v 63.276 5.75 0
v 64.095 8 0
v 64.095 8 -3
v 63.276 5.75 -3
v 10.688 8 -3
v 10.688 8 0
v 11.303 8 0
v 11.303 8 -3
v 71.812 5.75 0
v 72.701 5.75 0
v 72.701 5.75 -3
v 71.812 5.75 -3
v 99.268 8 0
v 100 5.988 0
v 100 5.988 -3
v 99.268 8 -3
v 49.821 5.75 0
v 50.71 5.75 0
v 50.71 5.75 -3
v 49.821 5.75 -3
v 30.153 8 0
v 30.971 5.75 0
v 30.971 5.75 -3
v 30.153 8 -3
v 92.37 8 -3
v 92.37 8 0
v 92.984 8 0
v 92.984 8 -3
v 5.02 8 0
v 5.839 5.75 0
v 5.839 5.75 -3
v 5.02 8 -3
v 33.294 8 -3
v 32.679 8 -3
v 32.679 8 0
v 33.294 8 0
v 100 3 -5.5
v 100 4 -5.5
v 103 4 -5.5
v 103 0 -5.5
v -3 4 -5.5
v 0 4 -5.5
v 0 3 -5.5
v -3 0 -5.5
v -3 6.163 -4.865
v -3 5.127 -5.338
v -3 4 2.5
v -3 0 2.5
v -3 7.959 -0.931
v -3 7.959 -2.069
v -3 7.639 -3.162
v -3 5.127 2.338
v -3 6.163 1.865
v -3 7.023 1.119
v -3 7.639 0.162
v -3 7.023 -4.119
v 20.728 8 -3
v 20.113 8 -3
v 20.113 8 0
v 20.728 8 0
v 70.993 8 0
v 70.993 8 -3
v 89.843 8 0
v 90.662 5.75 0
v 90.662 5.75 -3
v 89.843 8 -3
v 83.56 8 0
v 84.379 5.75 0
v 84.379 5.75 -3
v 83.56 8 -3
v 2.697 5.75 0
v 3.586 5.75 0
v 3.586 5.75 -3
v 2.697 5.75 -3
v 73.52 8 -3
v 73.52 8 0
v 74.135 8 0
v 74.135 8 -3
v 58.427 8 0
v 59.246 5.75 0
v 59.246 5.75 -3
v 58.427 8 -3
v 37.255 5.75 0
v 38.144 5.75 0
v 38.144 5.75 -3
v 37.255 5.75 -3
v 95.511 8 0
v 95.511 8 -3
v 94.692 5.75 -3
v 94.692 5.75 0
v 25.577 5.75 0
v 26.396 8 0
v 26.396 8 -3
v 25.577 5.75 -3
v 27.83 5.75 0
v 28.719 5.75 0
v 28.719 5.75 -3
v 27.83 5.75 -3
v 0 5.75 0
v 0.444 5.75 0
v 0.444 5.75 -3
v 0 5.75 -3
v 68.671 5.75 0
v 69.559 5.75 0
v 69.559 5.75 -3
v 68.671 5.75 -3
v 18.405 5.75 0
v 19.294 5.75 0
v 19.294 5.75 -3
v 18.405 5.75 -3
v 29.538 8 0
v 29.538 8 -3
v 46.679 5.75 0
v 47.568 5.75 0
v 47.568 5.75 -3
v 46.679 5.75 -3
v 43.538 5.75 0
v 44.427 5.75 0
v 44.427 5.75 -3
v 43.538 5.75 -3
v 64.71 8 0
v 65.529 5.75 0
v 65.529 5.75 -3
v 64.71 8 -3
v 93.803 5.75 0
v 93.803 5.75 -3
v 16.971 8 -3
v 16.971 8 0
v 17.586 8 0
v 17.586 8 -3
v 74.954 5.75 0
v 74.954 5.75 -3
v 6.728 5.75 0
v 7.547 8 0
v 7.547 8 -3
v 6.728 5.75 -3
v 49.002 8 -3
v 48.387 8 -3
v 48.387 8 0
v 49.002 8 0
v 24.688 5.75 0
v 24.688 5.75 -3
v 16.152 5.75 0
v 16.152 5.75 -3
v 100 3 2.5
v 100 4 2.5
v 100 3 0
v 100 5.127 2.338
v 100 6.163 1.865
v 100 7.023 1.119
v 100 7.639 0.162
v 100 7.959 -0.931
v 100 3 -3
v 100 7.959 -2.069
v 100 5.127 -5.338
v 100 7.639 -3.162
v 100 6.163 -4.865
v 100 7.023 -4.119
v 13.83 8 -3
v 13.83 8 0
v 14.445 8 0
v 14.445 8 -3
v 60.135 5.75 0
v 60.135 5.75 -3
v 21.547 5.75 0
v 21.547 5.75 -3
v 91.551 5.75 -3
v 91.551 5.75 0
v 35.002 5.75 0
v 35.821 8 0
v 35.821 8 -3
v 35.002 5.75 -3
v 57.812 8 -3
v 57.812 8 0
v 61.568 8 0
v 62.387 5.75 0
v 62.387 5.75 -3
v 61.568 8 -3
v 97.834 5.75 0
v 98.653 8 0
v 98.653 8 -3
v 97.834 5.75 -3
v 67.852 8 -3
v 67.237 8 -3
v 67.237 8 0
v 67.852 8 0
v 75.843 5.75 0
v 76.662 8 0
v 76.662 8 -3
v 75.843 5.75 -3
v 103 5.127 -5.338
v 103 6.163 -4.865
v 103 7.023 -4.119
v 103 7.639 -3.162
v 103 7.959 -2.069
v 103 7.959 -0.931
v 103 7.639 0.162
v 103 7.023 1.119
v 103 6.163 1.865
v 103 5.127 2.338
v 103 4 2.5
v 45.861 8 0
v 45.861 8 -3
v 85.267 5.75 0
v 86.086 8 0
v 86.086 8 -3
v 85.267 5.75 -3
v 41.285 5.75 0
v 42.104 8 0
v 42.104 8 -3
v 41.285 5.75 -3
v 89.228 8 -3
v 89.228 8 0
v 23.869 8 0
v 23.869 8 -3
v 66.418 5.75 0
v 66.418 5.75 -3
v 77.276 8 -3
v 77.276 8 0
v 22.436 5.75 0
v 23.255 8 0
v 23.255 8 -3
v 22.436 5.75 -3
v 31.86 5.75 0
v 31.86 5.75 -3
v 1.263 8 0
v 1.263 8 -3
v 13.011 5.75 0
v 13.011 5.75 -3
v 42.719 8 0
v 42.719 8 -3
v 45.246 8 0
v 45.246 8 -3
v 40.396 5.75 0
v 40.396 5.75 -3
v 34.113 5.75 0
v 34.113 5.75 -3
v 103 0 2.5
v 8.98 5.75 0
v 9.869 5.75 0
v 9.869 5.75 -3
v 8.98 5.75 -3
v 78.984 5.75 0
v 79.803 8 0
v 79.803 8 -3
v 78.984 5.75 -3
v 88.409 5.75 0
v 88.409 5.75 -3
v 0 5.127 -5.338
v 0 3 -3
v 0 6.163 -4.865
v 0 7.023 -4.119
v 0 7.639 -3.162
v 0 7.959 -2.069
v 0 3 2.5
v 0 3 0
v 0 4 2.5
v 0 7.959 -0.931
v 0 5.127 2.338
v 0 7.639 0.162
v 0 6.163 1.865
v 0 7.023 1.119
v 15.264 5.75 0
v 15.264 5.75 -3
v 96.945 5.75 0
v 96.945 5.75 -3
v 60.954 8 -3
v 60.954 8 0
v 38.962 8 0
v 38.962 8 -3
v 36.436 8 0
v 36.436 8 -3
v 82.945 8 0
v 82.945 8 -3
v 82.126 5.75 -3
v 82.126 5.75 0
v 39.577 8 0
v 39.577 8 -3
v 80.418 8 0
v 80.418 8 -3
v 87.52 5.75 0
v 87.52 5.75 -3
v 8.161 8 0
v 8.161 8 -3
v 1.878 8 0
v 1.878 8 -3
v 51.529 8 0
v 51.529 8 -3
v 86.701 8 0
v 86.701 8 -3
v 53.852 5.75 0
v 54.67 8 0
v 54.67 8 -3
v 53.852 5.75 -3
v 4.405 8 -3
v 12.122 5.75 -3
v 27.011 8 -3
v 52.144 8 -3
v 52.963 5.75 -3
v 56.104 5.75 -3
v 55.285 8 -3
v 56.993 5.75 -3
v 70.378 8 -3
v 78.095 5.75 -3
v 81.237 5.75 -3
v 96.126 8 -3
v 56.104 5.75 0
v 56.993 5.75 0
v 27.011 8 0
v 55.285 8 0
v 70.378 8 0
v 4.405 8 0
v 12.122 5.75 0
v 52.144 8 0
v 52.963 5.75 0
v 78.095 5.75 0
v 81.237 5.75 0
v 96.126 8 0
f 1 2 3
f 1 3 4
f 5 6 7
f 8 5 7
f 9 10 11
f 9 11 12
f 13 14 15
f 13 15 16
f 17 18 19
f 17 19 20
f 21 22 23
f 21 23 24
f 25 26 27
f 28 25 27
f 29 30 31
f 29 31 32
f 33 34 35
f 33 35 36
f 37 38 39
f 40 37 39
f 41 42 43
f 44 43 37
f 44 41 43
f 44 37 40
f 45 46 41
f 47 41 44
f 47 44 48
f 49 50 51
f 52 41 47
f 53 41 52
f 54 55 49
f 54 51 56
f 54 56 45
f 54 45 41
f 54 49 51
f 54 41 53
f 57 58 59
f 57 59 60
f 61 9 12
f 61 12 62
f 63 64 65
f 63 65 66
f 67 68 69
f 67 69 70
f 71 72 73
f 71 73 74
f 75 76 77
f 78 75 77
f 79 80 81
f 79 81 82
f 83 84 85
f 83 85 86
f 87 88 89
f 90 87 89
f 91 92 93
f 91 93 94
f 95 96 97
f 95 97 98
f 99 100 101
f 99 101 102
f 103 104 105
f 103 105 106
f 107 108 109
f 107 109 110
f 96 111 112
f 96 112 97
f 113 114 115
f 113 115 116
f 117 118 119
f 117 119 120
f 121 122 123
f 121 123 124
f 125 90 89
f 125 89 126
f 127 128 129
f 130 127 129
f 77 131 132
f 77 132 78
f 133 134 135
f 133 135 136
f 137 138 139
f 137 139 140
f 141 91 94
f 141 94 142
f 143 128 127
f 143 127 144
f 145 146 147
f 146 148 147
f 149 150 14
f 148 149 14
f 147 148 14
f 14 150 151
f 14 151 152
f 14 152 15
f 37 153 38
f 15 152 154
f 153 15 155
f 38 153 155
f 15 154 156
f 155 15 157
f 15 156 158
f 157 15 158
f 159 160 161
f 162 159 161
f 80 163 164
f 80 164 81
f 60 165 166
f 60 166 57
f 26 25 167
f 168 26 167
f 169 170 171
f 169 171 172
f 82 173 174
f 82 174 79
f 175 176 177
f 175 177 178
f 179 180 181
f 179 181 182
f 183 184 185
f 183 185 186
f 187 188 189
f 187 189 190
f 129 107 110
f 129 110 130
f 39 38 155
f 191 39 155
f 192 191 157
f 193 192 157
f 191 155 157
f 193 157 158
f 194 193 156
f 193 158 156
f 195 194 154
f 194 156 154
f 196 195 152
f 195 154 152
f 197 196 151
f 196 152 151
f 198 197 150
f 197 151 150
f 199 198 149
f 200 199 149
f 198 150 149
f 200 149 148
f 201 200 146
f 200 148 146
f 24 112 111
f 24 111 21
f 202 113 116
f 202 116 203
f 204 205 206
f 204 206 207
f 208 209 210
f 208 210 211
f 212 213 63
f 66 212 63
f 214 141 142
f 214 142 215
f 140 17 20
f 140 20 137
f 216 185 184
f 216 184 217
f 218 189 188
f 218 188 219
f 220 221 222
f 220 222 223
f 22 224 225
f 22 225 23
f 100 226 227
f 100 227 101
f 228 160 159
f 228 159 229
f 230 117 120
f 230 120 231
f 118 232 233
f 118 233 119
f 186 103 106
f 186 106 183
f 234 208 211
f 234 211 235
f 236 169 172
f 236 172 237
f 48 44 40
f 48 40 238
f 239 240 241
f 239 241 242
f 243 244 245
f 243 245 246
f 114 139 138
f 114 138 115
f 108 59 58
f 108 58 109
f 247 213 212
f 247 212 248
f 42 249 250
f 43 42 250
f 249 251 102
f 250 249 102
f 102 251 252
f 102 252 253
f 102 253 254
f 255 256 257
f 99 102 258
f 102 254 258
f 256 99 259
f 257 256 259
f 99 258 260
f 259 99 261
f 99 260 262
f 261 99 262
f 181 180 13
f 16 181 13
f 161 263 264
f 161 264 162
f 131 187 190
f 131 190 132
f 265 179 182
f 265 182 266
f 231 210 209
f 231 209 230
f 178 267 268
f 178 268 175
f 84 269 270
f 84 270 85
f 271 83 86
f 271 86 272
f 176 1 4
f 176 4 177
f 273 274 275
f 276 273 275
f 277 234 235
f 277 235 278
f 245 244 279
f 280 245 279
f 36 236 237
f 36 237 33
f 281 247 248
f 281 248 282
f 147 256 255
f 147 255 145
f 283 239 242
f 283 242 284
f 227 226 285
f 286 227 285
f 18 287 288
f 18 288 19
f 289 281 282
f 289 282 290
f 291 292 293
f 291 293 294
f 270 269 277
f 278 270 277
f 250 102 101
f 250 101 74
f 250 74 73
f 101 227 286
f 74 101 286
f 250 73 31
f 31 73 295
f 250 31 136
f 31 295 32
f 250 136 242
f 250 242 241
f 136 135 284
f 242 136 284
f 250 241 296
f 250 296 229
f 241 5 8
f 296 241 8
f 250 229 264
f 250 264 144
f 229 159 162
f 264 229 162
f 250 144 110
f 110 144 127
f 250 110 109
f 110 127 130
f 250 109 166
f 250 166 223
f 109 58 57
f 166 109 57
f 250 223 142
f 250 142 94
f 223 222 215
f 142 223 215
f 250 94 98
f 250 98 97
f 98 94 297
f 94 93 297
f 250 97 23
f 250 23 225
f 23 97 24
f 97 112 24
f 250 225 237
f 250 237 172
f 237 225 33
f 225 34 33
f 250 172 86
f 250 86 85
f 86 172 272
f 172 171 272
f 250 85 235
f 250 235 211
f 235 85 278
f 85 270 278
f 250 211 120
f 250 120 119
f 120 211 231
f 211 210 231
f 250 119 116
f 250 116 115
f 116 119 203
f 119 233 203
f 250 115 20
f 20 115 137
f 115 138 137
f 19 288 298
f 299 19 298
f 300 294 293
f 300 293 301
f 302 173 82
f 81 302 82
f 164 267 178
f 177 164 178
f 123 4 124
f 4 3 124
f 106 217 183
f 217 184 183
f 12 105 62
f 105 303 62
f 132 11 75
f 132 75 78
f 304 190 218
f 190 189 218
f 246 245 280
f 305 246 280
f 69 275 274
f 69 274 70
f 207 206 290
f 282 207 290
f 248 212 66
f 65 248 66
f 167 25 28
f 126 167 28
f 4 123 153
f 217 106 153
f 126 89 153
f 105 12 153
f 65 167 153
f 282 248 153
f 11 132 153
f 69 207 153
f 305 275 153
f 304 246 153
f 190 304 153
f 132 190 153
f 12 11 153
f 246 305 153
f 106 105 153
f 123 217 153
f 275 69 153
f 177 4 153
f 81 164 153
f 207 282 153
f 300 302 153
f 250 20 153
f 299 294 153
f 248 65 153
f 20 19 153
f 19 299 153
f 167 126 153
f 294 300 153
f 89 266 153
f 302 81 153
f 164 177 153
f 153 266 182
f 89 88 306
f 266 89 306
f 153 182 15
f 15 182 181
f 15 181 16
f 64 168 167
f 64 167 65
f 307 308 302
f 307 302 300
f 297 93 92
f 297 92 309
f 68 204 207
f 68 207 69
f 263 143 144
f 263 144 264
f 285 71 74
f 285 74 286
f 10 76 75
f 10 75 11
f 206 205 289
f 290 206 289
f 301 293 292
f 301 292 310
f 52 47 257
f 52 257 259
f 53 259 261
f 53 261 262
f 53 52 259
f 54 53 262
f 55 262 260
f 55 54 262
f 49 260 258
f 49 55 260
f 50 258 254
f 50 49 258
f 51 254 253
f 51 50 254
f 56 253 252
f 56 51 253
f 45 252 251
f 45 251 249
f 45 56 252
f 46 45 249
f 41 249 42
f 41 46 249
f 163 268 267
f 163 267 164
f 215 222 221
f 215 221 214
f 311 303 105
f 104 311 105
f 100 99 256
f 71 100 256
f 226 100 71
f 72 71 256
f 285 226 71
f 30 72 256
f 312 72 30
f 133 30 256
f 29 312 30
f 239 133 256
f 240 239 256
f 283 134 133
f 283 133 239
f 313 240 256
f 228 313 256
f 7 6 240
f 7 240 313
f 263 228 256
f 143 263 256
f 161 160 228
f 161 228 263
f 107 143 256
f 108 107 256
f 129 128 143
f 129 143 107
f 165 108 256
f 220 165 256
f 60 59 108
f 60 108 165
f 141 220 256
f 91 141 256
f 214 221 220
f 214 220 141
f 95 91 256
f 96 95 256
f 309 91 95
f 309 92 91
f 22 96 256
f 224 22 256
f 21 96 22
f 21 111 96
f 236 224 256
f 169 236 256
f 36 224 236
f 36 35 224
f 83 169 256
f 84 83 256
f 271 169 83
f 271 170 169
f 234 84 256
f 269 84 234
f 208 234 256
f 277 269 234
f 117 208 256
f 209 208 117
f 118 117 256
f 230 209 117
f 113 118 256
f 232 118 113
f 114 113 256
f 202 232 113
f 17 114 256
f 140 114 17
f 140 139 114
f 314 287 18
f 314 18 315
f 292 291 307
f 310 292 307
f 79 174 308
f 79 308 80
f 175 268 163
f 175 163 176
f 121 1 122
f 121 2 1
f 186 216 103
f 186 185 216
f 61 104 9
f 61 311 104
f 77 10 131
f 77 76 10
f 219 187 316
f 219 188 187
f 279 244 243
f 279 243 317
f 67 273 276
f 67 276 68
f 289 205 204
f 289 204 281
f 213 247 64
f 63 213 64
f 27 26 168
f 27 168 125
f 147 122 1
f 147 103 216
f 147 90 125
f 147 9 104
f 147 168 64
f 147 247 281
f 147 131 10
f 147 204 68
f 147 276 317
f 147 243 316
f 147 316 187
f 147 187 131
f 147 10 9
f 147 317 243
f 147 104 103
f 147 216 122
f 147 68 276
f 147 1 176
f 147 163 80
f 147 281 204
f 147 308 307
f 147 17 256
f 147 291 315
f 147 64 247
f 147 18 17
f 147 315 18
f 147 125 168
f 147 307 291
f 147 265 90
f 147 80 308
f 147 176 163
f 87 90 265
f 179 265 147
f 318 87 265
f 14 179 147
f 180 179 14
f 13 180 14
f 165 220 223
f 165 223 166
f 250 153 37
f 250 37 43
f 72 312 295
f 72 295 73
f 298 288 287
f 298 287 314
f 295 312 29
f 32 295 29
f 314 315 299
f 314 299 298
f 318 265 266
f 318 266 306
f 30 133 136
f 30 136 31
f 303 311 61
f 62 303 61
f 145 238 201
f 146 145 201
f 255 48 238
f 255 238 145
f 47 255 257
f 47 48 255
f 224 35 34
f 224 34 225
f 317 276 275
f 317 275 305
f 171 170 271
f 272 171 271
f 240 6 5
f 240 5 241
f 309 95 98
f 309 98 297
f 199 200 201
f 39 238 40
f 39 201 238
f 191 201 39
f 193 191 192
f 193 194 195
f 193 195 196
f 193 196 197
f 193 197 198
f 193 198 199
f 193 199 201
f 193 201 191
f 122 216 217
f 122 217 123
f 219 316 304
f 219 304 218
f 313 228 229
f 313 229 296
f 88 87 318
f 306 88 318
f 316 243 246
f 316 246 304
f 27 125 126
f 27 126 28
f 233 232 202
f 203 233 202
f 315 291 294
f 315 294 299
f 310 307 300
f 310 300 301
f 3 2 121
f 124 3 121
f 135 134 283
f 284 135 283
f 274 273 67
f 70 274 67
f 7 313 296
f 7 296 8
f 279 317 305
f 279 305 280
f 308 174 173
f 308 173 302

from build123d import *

# Parameters (mm, degrees)
BLANKSKE_W         = 100
BLANKSKE_H         = 8
BLANK_DEPTH        = 3
TOOTHCUTSIM_DEPTH  = 101.364336295
TEETHCUTS_COUNT    = 33
TEETHCUTS_PITCH    = 3.14159265
ESQUISSE1_W        = 100
ESQUISSE1_H        = 3
BOSS_EXTRU_1_DEPTH = 2.5
ESQUISSE2_W        = 100
ESQUISSE2_H        = 3
BOSS_EXTRU_2_DEPTH = 2.5
BOSS_EXTRU_3_DEPTH = 3
BOSS_EXTRU_4_START = 3
BOSS_EXTRU_4_DEPTH = 3


with BuildPart() as part:
    # BlankSke → Blank (new body)
    with BuildSketch(Plane.XY):
        with Locations((50, 4)):
            Rectangle(BLANKSKE_W, BLANKSKE_H)
    extrude(amount=-BLANK_DEPTH)

    # TooCutSkeSim → ToothCutSim (cut, through all)
    with BuildSketch(Plane.XY):
        Polygon((0.44443537, 5.75), (-0.44443537, 5.75), (-1.272613241, 8.0254), (1.272613241, 8.0254), align=None)
    toothcutsim = extrude(amount=-TOOTHCUTSIM_DEPTH, mode=Mode.SUBTRACT)

    # TeethCuts: ToothCutSim ×33
    with Locations(*[(i * TEETHCUTS_PITCH, 0, 0) for i in range(1, TEETHCUTS_COUNT)]):
        add(toothcutsim, mode=Mode.SUBTRACT)

    # Esquisse1 → Boss.-Extru.1 (add)
    with BuildSketch(Plane.XY):
        with Locations((50, 1.5)):
            Rectangle(ESQUISSE1_W, ESQUISSE1_H)
    extrude(amount=BOSS_EXTRU_1_DEPTH)

    # Esquisse2 → Boss.-Extru.2 (add)
    with BuildSketch(Plane(origin=(0, 0, -3), x_dir=(-1, 0, 0), z_dir=(0, 0, -1))):
        with Locations((-50, 1.5)):
            Rectangle(ESQUISSE2_W, ESQUISSE2_H)
    extrude(amount=BOSS_EXTRU_2_DEPTH)

    # Esquisse3 → Boss.-Extru.3 (add)
    with BuildSketch(Plane(origin=(100, 0, 0), x_dir=(0, 0, -1), z_dir=(1, 0, 0))):
        with BuildLine():
            Line((-2.5, 0), (5.5, 0))
            Line((5.5, 0), (5.5, 4))
            ThreePointArc((5.5, 4), (1.5, 8), (-2.5, 4))
            Line((-2.5, 4), (-2.5, 0))
        make_face()
    extrude(amount=BOSS_EXTRU_3_DEPTH)

    # Esquisse4 → Boss.-Extru.4 (add)
    with BuildSketch(Plane.ZY.offset(BOSS_EXTRU_4_START)):
        with BuildLine():
            Line((-5.5, 4), (-5.5, 0))
            Line((-5.5, 0), (2.5, 0))
            Line((2.5, 0), (2.5, 4))
            ThreePointArc((2.5, 4), (-1.5, 8), (-5.5, 4))
        make_face()
    extrude(amount=-BOSS_EXTRU_4_DEPTH)


solid = part.part
